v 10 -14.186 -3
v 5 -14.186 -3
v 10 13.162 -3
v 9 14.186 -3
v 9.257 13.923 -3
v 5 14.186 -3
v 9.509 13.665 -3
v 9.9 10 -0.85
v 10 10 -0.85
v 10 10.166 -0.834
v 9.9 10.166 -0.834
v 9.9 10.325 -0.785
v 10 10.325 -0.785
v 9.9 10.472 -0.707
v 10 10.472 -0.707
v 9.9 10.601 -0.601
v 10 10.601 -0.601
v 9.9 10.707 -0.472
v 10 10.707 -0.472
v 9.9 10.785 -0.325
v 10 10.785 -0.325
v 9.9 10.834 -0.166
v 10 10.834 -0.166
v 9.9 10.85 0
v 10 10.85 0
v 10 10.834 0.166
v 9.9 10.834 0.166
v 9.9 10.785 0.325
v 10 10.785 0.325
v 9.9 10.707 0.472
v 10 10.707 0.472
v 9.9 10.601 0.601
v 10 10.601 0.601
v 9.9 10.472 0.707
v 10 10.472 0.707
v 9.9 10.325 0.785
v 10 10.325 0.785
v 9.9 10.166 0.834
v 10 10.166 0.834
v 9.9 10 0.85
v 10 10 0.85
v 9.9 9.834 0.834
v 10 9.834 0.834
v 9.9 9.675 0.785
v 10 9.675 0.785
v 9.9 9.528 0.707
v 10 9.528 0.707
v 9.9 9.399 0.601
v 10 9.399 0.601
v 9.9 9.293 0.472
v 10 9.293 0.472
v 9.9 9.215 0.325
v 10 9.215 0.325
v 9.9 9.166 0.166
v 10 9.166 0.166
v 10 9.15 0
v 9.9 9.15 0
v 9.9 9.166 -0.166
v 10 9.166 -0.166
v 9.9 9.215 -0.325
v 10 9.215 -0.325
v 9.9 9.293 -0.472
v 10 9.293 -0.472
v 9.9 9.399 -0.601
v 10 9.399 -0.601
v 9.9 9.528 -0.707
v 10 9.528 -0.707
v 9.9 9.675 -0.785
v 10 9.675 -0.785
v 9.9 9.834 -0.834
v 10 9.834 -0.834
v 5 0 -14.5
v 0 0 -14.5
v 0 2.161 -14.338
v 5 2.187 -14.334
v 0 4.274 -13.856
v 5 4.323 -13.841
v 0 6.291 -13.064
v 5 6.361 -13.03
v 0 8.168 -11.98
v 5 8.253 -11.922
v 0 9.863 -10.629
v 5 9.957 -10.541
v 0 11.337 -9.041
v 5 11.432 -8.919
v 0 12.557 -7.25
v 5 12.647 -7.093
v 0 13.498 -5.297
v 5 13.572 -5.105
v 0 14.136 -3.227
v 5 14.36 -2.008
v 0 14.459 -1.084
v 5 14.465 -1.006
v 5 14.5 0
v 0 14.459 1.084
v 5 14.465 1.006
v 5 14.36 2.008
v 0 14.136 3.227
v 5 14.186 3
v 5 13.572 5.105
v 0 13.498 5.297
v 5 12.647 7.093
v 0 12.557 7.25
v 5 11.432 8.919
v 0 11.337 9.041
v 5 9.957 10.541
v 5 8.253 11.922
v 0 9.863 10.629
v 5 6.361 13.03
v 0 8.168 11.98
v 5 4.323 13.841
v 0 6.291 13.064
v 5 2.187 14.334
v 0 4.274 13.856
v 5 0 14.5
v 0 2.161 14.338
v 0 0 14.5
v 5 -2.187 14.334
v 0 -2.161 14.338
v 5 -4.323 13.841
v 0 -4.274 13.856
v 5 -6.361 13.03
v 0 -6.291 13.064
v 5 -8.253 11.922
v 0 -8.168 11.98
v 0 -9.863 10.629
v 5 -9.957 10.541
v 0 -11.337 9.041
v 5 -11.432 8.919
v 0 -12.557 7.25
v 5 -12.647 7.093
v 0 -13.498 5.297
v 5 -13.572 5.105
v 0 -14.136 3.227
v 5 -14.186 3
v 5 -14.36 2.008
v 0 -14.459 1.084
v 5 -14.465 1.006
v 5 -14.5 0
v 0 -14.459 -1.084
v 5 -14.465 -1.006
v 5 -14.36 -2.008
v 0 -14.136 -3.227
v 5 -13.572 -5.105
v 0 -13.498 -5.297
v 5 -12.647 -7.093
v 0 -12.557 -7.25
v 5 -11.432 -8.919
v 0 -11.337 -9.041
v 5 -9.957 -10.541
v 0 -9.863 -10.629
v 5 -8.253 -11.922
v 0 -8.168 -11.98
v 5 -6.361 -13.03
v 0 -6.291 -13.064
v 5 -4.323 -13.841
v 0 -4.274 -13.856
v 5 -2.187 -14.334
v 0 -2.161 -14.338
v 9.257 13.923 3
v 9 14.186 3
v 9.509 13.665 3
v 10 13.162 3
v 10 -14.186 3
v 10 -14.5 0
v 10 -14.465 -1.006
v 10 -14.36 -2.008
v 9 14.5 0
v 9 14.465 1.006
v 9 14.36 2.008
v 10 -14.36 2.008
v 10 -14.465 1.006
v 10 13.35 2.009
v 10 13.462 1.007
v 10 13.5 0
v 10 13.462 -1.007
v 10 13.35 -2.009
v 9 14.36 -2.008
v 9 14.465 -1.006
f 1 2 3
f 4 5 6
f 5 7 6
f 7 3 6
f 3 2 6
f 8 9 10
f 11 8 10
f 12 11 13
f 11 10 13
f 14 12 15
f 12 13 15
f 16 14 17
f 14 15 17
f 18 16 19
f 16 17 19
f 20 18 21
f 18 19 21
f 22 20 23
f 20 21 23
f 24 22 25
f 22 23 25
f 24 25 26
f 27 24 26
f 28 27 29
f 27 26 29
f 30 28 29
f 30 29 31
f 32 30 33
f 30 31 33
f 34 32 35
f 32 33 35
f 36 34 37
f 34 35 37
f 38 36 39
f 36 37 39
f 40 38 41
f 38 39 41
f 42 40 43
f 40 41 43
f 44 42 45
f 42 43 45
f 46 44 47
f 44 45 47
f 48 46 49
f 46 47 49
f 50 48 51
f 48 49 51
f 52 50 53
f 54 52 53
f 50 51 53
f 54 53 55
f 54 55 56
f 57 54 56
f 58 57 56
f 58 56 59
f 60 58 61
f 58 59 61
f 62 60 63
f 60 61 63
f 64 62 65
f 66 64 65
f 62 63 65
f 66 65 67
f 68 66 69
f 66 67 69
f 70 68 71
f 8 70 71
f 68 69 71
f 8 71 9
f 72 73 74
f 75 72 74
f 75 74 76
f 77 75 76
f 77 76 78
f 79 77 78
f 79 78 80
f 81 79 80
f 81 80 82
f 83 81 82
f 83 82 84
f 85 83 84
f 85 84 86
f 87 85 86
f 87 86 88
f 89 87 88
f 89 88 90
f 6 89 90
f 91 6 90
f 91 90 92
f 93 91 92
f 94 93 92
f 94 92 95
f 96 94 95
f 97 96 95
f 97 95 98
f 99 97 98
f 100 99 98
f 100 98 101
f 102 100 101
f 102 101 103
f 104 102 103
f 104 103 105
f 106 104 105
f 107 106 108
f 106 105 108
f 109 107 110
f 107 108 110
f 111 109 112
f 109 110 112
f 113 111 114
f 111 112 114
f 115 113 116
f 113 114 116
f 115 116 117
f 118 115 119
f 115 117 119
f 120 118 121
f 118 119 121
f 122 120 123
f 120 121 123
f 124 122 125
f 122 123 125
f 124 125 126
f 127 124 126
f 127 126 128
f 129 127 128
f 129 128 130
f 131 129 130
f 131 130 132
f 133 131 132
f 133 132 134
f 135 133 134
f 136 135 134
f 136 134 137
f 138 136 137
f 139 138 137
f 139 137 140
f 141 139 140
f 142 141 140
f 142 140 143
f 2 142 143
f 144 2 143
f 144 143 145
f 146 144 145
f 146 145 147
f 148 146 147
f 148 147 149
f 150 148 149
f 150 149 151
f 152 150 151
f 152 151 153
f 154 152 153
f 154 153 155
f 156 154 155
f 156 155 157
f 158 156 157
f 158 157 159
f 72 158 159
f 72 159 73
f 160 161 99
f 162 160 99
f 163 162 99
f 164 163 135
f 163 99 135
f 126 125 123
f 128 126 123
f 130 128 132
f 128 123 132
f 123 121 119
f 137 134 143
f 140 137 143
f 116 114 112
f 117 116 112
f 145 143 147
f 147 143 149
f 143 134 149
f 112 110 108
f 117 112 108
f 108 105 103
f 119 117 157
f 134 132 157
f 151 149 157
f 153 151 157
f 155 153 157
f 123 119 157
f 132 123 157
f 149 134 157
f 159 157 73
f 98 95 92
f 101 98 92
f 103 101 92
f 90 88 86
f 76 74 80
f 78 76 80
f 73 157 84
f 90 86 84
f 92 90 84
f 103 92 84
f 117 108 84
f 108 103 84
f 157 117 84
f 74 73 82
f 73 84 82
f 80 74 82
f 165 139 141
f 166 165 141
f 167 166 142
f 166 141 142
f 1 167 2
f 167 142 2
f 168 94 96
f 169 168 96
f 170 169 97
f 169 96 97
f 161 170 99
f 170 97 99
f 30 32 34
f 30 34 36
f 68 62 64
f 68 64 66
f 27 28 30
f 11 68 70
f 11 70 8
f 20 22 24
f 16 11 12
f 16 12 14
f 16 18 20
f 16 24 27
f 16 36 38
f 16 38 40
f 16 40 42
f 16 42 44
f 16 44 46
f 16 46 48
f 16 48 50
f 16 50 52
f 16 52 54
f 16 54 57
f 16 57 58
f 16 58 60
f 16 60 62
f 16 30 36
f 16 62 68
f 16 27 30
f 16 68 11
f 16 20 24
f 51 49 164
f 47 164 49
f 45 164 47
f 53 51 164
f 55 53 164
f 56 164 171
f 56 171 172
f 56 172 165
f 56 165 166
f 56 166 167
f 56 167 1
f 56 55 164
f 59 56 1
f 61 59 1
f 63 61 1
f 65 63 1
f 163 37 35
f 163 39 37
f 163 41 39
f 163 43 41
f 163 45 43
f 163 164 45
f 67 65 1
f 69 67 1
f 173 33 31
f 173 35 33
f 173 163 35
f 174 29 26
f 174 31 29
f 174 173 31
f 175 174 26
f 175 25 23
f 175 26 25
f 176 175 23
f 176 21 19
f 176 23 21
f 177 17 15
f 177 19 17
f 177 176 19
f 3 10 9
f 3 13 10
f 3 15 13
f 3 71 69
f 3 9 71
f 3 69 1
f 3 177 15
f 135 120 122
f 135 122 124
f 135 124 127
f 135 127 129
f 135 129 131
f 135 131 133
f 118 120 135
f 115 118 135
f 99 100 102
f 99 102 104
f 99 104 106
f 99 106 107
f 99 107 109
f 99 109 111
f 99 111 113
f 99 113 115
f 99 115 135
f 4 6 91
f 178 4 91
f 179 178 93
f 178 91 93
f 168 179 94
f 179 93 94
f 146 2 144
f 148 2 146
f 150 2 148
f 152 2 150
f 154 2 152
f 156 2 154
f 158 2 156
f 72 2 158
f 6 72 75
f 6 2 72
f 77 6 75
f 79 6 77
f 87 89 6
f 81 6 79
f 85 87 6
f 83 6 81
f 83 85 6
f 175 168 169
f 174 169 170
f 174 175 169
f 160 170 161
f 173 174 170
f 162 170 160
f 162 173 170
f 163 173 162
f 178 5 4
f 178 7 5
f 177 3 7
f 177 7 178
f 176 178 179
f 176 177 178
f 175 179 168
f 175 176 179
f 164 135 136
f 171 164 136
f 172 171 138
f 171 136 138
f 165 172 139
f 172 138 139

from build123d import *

# Parameters (mm, degrees)
SKETCH_1_R          = 14.5
EXTRUDE_1_DEPTH     = 5
EXTRUDE_2_DEPTH     = 5
CHAMFER_1_SIZE      = 1
SKETCH_3_R          = 0.85
CUT_EXTRUDE_1_DEPTH = 0.1


with BuildPart() as part:
    # 草图1 → 凸台-拉伸1 (new body)
    with BuildSketch(Plane(origin=(0, 0, 0), x_dir=(0, 0, -1), z_dir=(1, 0, 0))):
        Circle(SKETCH_1_R)
    extrude(amount=EXTRUDE_1_DEPTH)

    # 草图2 → 凸台-拉伸2 (add)
    with BuildSketch(Plane(origin=(5, 0, 0), x_dir=(0, 0, -1), z_dir=(1, 0, 0))):
        with BuildLine():
            ThreePointArc((3, 14.186260959), (1.508180397, 14.421351944), (4.2e-08, 14.5))
            ThreePointArc((4.2e-08, 14.5), (-1.508180355, 14.421351948), (-3, 14.186260959))
            Line((-3, 14.186260959), (-3, -14.186260959))
            ThreePointArc((-3, -14.186260959), (-1.508180376, -14.421351946), (0, -14.5))
            ThreePointArc((0, -14.5), (1.508180376, -14.421351946), (3, -14.186260959))
            Line((3, -14.186260959), (3, 14.186260959))
        make_face()
    extrude(amount=EXTRUDE_2_DEPTH)

    # 倒角1
    chamfer_1_edges = [part.edges().sort_by_distance(p)[0] for p in [
        (10, 14.5, 0),
    ]]
    chamfer(chamfer_1_edges, length=CHAMFER_1_SIZE)

    # 草图3 → 切除-拉伸1 (cut)
    with BuildSketch(Plane(origin=(10, 0, 0), x_dir=(0, 0, -1), z_dir=(1, 0, 0))):
        with Locations((0, 10)):
            Circle(SKETCH_3_R)
    extrude(amount=-CUT_EXTRUDE_1_DEPTH, mode=Mode.SUBTRACT)


solid = part.part
